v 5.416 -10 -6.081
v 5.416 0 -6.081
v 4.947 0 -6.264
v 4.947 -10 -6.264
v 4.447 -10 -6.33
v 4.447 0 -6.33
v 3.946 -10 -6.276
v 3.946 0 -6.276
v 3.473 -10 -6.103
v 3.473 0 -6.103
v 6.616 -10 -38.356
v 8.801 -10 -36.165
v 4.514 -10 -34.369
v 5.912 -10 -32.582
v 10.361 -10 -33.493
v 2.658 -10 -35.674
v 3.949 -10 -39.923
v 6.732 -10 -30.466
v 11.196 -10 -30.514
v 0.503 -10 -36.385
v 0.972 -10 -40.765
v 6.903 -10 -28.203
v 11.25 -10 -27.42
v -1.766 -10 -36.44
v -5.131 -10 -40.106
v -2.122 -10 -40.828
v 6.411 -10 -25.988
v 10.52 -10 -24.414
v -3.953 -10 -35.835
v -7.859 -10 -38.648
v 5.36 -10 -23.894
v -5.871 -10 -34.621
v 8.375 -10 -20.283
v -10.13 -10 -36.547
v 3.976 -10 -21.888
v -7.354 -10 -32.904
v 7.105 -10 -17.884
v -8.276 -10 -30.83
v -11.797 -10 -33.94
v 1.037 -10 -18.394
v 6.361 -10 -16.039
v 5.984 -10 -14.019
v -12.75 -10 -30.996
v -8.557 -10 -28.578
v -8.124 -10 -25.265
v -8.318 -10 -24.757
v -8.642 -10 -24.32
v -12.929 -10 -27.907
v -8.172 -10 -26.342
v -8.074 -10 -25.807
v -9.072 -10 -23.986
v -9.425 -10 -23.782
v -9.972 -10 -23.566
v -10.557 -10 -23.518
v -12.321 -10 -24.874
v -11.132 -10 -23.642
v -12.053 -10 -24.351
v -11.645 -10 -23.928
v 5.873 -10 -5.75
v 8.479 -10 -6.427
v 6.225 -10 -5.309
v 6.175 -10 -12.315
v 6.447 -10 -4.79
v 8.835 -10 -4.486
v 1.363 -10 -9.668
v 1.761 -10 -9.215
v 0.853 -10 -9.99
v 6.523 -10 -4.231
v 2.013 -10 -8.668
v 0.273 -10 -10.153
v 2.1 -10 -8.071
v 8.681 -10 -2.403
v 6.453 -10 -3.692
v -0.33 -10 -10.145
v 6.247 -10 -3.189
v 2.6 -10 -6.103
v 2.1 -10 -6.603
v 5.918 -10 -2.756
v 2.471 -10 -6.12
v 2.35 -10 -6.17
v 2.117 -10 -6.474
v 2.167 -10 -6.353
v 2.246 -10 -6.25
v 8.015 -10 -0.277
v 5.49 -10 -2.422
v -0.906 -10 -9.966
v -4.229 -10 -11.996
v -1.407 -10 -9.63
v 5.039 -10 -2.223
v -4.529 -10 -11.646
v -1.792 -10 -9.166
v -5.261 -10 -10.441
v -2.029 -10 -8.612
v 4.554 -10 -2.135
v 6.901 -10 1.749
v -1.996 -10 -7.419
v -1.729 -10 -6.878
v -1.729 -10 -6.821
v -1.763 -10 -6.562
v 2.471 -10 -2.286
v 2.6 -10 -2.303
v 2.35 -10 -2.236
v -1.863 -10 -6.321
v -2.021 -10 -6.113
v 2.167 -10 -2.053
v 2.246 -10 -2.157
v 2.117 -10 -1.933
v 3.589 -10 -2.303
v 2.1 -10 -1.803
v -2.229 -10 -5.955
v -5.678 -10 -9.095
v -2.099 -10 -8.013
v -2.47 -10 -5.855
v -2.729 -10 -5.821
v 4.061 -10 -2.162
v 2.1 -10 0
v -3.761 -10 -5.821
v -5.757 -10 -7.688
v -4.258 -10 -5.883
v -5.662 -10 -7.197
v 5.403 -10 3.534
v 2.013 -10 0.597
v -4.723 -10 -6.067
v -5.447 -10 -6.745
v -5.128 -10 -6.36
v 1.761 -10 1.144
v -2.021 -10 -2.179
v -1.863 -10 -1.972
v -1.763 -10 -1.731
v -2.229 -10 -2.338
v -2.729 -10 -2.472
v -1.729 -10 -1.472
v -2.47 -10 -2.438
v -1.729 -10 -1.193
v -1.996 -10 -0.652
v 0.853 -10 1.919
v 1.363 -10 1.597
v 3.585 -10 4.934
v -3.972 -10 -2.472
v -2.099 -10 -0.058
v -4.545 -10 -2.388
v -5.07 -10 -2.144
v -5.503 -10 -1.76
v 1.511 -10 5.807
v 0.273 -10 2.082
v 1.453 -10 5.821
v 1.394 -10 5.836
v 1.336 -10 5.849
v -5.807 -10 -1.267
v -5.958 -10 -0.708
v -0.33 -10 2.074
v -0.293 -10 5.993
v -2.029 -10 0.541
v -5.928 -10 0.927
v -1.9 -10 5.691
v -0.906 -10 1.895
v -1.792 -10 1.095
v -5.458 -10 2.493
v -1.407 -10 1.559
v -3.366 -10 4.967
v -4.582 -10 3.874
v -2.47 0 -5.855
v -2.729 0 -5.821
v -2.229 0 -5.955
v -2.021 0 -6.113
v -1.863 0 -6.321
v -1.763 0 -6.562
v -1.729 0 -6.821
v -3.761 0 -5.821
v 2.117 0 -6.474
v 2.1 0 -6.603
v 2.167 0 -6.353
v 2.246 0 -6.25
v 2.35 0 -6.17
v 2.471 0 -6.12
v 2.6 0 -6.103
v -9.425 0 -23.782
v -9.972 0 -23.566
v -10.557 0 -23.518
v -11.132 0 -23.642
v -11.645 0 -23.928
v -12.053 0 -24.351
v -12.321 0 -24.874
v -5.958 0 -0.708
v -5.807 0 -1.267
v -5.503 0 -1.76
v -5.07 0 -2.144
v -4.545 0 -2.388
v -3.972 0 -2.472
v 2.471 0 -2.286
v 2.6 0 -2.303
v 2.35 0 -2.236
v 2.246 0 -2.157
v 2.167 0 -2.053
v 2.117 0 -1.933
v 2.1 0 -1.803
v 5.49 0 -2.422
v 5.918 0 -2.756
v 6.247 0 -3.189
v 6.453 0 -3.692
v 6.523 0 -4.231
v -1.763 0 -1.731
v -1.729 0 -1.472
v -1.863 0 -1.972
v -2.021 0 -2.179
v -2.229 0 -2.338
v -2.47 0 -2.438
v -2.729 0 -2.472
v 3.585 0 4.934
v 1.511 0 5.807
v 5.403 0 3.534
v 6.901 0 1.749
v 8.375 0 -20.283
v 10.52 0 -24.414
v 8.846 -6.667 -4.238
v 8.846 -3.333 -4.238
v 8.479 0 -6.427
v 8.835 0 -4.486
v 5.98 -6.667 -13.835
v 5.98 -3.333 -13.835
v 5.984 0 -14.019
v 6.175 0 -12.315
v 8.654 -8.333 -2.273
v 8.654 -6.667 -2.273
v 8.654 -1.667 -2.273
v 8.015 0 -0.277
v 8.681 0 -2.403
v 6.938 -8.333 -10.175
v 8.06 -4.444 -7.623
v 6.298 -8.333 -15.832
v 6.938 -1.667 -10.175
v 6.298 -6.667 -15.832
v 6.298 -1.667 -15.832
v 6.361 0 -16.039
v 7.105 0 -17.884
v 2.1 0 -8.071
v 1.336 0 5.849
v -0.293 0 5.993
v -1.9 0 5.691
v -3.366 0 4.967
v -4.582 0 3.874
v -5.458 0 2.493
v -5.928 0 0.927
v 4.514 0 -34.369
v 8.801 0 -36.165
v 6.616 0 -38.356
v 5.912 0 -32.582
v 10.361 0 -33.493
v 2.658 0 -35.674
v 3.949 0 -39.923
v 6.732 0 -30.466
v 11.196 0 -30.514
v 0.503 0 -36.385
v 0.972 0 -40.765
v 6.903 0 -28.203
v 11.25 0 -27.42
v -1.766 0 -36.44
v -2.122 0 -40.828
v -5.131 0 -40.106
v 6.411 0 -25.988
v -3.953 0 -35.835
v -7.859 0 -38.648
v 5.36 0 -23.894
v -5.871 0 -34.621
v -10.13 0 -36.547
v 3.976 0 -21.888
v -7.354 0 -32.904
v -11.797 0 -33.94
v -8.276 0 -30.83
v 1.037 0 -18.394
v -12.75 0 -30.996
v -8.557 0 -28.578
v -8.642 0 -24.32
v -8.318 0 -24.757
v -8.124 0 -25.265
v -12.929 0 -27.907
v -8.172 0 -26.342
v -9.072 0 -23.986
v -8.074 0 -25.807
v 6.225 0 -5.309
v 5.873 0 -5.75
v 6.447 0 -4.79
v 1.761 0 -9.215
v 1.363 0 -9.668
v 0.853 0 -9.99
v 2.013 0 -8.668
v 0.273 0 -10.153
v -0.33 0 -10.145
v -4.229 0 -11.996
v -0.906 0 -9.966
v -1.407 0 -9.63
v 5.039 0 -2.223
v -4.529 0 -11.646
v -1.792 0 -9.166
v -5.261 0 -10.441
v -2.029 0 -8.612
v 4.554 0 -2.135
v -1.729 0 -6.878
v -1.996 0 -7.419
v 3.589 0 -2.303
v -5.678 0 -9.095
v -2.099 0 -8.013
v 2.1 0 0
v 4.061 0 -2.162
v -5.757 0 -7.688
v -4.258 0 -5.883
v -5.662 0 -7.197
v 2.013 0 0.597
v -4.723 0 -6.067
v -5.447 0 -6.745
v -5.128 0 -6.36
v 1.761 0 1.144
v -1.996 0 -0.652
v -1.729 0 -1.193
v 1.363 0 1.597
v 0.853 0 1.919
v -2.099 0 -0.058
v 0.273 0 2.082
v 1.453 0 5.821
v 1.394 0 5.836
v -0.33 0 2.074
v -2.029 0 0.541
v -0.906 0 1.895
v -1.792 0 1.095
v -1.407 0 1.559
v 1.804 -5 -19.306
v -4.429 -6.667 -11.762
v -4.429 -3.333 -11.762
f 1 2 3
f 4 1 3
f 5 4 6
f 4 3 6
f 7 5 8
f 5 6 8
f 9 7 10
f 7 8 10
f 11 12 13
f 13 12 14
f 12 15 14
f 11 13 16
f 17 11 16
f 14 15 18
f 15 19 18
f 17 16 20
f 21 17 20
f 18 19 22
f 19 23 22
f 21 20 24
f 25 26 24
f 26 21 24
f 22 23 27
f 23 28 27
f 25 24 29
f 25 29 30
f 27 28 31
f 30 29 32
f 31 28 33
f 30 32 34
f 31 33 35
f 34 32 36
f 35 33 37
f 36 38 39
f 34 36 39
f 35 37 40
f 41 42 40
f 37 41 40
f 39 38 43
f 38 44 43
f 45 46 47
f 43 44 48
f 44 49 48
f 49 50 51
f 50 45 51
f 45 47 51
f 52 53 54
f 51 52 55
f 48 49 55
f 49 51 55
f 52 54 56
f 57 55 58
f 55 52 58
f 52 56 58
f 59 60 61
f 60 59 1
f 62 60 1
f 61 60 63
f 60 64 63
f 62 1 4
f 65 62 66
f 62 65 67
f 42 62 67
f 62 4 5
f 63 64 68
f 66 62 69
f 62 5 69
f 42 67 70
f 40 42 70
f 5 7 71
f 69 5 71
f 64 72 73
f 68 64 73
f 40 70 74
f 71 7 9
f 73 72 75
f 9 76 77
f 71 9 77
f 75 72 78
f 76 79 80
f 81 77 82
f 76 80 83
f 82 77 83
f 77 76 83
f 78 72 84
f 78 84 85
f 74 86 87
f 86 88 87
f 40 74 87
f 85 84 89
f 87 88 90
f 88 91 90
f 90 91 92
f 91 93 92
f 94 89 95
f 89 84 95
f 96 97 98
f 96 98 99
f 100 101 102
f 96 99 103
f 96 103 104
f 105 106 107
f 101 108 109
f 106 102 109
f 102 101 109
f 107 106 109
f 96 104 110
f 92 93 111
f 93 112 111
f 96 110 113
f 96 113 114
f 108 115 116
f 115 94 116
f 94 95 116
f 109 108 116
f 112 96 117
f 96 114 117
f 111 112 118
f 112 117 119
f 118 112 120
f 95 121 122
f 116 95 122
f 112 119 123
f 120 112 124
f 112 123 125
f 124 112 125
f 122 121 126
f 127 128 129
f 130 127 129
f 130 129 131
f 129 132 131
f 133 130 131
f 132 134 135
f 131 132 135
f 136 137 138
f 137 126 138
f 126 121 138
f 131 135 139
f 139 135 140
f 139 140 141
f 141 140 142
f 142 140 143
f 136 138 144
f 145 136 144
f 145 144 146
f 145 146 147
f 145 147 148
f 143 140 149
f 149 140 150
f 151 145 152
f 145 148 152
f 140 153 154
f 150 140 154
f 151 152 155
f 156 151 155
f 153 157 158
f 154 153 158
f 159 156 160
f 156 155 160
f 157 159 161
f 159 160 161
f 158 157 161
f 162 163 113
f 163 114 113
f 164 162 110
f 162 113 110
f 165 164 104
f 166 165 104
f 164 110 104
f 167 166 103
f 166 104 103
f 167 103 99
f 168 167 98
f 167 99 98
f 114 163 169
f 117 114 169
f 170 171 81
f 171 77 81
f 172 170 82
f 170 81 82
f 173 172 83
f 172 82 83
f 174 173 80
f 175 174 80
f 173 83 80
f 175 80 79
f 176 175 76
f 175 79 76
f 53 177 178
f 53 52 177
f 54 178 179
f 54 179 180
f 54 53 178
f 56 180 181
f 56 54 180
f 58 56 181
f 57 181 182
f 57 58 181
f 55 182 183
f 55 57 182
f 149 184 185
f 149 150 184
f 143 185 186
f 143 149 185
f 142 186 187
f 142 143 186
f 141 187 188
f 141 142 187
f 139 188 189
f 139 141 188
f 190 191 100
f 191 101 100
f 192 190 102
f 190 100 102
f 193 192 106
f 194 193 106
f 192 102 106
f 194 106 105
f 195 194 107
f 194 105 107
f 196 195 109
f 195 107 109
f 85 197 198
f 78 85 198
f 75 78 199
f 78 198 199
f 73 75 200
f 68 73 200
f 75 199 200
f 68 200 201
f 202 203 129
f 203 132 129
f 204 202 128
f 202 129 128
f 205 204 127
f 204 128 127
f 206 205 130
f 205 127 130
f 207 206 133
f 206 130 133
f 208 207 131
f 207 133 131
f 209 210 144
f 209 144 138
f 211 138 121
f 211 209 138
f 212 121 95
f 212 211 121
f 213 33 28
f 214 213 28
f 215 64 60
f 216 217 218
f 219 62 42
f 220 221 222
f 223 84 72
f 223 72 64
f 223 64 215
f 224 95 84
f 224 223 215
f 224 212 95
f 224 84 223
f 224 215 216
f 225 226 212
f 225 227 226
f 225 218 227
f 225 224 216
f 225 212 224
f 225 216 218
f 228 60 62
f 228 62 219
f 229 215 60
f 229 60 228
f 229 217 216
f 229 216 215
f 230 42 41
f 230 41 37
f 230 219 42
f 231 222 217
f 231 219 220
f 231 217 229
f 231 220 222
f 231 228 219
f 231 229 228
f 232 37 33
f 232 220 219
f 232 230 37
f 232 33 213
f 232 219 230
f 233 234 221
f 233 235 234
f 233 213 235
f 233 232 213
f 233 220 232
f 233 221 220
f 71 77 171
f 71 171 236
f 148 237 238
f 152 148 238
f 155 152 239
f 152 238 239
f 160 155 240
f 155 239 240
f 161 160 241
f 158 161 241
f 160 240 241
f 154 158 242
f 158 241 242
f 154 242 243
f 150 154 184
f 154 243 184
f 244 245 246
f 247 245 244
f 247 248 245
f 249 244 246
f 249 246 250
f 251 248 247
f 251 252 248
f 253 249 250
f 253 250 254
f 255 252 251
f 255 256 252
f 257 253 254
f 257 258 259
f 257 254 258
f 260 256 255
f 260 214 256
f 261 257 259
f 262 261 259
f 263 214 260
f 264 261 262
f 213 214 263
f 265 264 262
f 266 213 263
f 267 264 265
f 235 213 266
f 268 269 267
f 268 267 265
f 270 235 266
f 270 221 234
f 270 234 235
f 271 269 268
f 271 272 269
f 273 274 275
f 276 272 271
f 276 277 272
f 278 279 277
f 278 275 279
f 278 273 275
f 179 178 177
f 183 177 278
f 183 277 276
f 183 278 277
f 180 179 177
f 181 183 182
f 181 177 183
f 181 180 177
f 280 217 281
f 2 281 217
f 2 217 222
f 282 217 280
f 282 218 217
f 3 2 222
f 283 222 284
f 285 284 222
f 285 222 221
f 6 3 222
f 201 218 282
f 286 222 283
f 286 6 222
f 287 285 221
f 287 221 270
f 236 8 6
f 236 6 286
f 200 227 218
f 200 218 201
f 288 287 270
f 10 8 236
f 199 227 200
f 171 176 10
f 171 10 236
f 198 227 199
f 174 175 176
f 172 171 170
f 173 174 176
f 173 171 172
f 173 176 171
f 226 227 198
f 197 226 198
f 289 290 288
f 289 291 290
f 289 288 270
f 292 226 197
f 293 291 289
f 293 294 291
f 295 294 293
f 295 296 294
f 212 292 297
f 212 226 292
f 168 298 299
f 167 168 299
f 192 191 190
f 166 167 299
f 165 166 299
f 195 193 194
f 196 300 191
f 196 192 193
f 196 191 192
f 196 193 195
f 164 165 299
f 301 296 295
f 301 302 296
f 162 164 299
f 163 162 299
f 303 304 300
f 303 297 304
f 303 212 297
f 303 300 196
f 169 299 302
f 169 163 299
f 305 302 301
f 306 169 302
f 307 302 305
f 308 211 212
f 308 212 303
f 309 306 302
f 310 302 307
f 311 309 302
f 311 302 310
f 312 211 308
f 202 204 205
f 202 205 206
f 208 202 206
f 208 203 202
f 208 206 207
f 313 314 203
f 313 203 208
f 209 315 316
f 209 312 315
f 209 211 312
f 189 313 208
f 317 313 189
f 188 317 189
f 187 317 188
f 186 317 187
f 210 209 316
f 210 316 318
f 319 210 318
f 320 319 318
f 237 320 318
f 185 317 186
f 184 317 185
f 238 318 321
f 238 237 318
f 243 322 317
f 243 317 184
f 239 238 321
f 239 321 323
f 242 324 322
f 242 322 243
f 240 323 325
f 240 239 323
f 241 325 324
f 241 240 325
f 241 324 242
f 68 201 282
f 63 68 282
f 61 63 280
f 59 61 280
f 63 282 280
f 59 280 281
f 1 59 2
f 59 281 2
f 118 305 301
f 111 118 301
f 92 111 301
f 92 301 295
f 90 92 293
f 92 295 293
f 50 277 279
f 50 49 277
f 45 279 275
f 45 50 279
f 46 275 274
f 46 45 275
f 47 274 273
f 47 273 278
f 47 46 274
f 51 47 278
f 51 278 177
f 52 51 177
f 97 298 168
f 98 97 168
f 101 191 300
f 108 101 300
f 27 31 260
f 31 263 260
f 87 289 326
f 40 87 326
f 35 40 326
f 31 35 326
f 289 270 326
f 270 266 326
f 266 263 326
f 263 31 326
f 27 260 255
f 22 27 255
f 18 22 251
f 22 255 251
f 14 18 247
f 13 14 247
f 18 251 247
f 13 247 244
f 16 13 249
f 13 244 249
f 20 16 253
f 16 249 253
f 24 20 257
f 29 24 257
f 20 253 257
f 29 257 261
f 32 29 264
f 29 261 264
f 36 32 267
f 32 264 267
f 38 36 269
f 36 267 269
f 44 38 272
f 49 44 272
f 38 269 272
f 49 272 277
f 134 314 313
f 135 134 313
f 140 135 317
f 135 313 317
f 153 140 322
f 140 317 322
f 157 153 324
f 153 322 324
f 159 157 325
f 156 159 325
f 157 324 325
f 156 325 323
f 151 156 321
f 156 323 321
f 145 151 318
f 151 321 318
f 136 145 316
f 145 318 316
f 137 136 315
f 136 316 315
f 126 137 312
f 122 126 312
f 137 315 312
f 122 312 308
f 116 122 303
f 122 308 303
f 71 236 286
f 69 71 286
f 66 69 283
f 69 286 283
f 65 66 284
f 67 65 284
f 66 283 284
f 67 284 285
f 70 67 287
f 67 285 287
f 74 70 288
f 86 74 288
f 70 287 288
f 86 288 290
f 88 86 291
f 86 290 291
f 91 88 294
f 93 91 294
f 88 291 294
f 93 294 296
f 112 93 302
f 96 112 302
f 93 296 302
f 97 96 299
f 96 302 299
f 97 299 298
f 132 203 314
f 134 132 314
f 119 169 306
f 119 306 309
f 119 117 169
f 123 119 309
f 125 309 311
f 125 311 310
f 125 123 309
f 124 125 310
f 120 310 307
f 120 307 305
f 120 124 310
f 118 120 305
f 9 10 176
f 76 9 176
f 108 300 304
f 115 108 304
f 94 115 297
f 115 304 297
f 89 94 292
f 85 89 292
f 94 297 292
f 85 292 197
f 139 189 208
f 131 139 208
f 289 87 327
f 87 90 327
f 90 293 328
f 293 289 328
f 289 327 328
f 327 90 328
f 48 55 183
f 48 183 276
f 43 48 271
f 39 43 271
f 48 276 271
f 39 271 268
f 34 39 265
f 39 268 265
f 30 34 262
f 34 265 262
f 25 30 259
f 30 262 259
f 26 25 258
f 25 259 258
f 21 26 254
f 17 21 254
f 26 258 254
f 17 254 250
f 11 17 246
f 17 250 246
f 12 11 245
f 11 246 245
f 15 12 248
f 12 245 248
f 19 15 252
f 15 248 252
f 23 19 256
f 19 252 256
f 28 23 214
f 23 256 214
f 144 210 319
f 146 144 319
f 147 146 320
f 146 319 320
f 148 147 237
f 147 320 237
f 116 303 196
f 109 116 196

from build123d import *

# Parameters (mm, degrees)
F1_DEPTH = 10
F2_R     = 1
F3_R     = 2
F4_R     = 0.5


with BuildPart() as f1:
    # F0 (on Front) → F1 (new body)
    with BuildSketch(Plane.XZ):
        with BuildLine():
            add(Edge.make_bspline(
                [(1.5112039039, 5.8065706541), (5.7834953099, 4.7065008724), (11.8156523878, -4.7347263591), (3.0061887209, -13.6750164571), (9.173676435, -21.061609973), (10.5198239377, -24.4136286822)],
                knots=[0.0047213261, 0.0047213261, 0.0047213261, 0.0047213261, 0.3509831279, 0.6641973473, 1, 1, 1, 1], degree=3))
            ThreePointArc((1.5112039039, 5.8065706541), (5.4017035076, 2.6118191391), (5.4896402552, -2.4215387398))
            ThreePointArc((5.4896402552, -2.4215387398), (6.2465875364, -3.188852596), (6.5231922366, -4.2305961251))
            ThreePointArc((6.5231922366, -4.2305961251), (6.225200021, -5.3089133071), (5.4157941938, -6.0812017975))
            ThreePointArc((5.4157941938, -6.0812017975), (3.0163538383, -12.9894945105), (-4.2289772618, -11.9960160364))
            add(Edge.make_bspline(
                [(-4.2289772618, -11.9960160364), (-2.1170324589, -14.4737038468), (1.871939821, -19.6061252586), (5.1872399636, -23.06487225), (6.4110226343, -25.9877145657)],
                knots=[0.0237271282, 0.0237271282, 0.0237271282, 0.0237271282, 0.5253023233, 1, 1, 1, 1], degree=3))
            ThreePointArc((6.4110226343, -25.9877145657), (-1.4294843622, -36.4738181218), (-7.5196663351, -24.8832356822))
            Line((-7.5196663351, -24.8832356822), (-11.3290949579, -22.6813619148))
            ThreePointArc((-11.3290949579, -22.6813619148), (-1.7772420469, -40.8600533084), (10.5198239377, -24.4136286822))
        make_face()
        with BuildLine():
            ThreePointArc((-1.7285399627, -1.1925391387), (-0.6245262518, 2.0049855263), (2.1, 0))
            Line((2.1, 0), (2.1, -2.3033259844))
            Line((2.1, -2.3033259844), (3.5891479903, -2.3033259844))
            ThreePointArc((3.5891479903, -2.3033259844), (4.5535626405, -2.1346468038), (5.4896402552, -2.4215387398))
            ThreePointArc((5.4896402552, -2.4215387398), (5.4017035076, 2.6118191391), (1.5112039039, 5.8065706541))
            ThreePointArc((1.5112039039, 5.8065706541), (1.4236796844, 5.8286478841), (1.3358332429, 5.849405914))
            ThreePointArc((1.3358332429, 5.849405914), (-4.6453170358, 3.7975030793), (-5.4670086667, -2.4722087772))
            Line((-5.4670086667, -2.4722087772), (-1.7285399627, -2.4722087772))
            Line((-1.7285399627, -2.4722087772), (-1.7285399627, -1.1925391387))
        make_face()
        with BuildLine():
            Line((3.4729907453, -6.1033259844), (2.1, -6.1033259844))
            Line((2.1, -6.1033259844), (2.1, -8.0709895119))
            ThreePointArc((2.1, -8.0709895119), (-0.6245262518, -10.0759750383), (-1.7285399627, -6.8784503732))
            Line((-1.7285399627, -6.8784503732), (-1.7285399627, -5.8205844834))
            Line((-1.7285399627, -5.8205844834), (-5.3127920255, -5.8205844834))
            ThreePointArc((-5.3127920255, -5.8205844834), (-5.7182347895, -8.8403222036), (-4.5291030542, -11.6455254849))
            add(Edge.make_bspline(
                [(-4.5291030542, -11.6455254849), (-4.4289292872, -11.7619570644), (-4.3288832889, -11.8788084534), (-4.2289772618, -11.9960160364)],
                knots=[0, 0, 0, 0, 0.0237271282, 0.0237271282, 0.0237271282, 0.0237271282], degree=3))
            ThreePointArc((-4.2289772618, -11.9960160364), (3.0163538383, -12.9894945105), (5.4157941938, -6.0812017975))
            ThreePointArc((5.4157941938, -6.0812017975), (4.4471049903, -6.3304599731), (3.4729907453, -6.1033259844))
        make_face()
    extrude(amount=F1_DEPTH)

    # F2
    f2_edges = [f1.edges().sort_by_distance(p)[0] for p in [
        (-1.72854, -5, -2.472209),
        (-1.72854, -5, -5.820584),
    ]]
    fillet(f2_edges, radius=F2_R)

    # F3
    f3_edges = [f1.edges().sort_by_distance(p)[0] for p in [
        (-11.329095, -5, -22.681362),
        (-7.519666, -5, -24.883236),
        (-5.467009, -5, -2.472209),
        (-5.312792, -5, -5.820584),
    ]]
    fillet(f3_edges, radius=F3_R)

    # F4
    f4_edges = [f1.edges().sort_by_distance(p)[0] for p in [
        (2.1, -5, -2.303326),
        (2.1, -5, -6.103326),
    ]]
    fillet(f4_edges, radius=F4_R)


solid = f1.part
